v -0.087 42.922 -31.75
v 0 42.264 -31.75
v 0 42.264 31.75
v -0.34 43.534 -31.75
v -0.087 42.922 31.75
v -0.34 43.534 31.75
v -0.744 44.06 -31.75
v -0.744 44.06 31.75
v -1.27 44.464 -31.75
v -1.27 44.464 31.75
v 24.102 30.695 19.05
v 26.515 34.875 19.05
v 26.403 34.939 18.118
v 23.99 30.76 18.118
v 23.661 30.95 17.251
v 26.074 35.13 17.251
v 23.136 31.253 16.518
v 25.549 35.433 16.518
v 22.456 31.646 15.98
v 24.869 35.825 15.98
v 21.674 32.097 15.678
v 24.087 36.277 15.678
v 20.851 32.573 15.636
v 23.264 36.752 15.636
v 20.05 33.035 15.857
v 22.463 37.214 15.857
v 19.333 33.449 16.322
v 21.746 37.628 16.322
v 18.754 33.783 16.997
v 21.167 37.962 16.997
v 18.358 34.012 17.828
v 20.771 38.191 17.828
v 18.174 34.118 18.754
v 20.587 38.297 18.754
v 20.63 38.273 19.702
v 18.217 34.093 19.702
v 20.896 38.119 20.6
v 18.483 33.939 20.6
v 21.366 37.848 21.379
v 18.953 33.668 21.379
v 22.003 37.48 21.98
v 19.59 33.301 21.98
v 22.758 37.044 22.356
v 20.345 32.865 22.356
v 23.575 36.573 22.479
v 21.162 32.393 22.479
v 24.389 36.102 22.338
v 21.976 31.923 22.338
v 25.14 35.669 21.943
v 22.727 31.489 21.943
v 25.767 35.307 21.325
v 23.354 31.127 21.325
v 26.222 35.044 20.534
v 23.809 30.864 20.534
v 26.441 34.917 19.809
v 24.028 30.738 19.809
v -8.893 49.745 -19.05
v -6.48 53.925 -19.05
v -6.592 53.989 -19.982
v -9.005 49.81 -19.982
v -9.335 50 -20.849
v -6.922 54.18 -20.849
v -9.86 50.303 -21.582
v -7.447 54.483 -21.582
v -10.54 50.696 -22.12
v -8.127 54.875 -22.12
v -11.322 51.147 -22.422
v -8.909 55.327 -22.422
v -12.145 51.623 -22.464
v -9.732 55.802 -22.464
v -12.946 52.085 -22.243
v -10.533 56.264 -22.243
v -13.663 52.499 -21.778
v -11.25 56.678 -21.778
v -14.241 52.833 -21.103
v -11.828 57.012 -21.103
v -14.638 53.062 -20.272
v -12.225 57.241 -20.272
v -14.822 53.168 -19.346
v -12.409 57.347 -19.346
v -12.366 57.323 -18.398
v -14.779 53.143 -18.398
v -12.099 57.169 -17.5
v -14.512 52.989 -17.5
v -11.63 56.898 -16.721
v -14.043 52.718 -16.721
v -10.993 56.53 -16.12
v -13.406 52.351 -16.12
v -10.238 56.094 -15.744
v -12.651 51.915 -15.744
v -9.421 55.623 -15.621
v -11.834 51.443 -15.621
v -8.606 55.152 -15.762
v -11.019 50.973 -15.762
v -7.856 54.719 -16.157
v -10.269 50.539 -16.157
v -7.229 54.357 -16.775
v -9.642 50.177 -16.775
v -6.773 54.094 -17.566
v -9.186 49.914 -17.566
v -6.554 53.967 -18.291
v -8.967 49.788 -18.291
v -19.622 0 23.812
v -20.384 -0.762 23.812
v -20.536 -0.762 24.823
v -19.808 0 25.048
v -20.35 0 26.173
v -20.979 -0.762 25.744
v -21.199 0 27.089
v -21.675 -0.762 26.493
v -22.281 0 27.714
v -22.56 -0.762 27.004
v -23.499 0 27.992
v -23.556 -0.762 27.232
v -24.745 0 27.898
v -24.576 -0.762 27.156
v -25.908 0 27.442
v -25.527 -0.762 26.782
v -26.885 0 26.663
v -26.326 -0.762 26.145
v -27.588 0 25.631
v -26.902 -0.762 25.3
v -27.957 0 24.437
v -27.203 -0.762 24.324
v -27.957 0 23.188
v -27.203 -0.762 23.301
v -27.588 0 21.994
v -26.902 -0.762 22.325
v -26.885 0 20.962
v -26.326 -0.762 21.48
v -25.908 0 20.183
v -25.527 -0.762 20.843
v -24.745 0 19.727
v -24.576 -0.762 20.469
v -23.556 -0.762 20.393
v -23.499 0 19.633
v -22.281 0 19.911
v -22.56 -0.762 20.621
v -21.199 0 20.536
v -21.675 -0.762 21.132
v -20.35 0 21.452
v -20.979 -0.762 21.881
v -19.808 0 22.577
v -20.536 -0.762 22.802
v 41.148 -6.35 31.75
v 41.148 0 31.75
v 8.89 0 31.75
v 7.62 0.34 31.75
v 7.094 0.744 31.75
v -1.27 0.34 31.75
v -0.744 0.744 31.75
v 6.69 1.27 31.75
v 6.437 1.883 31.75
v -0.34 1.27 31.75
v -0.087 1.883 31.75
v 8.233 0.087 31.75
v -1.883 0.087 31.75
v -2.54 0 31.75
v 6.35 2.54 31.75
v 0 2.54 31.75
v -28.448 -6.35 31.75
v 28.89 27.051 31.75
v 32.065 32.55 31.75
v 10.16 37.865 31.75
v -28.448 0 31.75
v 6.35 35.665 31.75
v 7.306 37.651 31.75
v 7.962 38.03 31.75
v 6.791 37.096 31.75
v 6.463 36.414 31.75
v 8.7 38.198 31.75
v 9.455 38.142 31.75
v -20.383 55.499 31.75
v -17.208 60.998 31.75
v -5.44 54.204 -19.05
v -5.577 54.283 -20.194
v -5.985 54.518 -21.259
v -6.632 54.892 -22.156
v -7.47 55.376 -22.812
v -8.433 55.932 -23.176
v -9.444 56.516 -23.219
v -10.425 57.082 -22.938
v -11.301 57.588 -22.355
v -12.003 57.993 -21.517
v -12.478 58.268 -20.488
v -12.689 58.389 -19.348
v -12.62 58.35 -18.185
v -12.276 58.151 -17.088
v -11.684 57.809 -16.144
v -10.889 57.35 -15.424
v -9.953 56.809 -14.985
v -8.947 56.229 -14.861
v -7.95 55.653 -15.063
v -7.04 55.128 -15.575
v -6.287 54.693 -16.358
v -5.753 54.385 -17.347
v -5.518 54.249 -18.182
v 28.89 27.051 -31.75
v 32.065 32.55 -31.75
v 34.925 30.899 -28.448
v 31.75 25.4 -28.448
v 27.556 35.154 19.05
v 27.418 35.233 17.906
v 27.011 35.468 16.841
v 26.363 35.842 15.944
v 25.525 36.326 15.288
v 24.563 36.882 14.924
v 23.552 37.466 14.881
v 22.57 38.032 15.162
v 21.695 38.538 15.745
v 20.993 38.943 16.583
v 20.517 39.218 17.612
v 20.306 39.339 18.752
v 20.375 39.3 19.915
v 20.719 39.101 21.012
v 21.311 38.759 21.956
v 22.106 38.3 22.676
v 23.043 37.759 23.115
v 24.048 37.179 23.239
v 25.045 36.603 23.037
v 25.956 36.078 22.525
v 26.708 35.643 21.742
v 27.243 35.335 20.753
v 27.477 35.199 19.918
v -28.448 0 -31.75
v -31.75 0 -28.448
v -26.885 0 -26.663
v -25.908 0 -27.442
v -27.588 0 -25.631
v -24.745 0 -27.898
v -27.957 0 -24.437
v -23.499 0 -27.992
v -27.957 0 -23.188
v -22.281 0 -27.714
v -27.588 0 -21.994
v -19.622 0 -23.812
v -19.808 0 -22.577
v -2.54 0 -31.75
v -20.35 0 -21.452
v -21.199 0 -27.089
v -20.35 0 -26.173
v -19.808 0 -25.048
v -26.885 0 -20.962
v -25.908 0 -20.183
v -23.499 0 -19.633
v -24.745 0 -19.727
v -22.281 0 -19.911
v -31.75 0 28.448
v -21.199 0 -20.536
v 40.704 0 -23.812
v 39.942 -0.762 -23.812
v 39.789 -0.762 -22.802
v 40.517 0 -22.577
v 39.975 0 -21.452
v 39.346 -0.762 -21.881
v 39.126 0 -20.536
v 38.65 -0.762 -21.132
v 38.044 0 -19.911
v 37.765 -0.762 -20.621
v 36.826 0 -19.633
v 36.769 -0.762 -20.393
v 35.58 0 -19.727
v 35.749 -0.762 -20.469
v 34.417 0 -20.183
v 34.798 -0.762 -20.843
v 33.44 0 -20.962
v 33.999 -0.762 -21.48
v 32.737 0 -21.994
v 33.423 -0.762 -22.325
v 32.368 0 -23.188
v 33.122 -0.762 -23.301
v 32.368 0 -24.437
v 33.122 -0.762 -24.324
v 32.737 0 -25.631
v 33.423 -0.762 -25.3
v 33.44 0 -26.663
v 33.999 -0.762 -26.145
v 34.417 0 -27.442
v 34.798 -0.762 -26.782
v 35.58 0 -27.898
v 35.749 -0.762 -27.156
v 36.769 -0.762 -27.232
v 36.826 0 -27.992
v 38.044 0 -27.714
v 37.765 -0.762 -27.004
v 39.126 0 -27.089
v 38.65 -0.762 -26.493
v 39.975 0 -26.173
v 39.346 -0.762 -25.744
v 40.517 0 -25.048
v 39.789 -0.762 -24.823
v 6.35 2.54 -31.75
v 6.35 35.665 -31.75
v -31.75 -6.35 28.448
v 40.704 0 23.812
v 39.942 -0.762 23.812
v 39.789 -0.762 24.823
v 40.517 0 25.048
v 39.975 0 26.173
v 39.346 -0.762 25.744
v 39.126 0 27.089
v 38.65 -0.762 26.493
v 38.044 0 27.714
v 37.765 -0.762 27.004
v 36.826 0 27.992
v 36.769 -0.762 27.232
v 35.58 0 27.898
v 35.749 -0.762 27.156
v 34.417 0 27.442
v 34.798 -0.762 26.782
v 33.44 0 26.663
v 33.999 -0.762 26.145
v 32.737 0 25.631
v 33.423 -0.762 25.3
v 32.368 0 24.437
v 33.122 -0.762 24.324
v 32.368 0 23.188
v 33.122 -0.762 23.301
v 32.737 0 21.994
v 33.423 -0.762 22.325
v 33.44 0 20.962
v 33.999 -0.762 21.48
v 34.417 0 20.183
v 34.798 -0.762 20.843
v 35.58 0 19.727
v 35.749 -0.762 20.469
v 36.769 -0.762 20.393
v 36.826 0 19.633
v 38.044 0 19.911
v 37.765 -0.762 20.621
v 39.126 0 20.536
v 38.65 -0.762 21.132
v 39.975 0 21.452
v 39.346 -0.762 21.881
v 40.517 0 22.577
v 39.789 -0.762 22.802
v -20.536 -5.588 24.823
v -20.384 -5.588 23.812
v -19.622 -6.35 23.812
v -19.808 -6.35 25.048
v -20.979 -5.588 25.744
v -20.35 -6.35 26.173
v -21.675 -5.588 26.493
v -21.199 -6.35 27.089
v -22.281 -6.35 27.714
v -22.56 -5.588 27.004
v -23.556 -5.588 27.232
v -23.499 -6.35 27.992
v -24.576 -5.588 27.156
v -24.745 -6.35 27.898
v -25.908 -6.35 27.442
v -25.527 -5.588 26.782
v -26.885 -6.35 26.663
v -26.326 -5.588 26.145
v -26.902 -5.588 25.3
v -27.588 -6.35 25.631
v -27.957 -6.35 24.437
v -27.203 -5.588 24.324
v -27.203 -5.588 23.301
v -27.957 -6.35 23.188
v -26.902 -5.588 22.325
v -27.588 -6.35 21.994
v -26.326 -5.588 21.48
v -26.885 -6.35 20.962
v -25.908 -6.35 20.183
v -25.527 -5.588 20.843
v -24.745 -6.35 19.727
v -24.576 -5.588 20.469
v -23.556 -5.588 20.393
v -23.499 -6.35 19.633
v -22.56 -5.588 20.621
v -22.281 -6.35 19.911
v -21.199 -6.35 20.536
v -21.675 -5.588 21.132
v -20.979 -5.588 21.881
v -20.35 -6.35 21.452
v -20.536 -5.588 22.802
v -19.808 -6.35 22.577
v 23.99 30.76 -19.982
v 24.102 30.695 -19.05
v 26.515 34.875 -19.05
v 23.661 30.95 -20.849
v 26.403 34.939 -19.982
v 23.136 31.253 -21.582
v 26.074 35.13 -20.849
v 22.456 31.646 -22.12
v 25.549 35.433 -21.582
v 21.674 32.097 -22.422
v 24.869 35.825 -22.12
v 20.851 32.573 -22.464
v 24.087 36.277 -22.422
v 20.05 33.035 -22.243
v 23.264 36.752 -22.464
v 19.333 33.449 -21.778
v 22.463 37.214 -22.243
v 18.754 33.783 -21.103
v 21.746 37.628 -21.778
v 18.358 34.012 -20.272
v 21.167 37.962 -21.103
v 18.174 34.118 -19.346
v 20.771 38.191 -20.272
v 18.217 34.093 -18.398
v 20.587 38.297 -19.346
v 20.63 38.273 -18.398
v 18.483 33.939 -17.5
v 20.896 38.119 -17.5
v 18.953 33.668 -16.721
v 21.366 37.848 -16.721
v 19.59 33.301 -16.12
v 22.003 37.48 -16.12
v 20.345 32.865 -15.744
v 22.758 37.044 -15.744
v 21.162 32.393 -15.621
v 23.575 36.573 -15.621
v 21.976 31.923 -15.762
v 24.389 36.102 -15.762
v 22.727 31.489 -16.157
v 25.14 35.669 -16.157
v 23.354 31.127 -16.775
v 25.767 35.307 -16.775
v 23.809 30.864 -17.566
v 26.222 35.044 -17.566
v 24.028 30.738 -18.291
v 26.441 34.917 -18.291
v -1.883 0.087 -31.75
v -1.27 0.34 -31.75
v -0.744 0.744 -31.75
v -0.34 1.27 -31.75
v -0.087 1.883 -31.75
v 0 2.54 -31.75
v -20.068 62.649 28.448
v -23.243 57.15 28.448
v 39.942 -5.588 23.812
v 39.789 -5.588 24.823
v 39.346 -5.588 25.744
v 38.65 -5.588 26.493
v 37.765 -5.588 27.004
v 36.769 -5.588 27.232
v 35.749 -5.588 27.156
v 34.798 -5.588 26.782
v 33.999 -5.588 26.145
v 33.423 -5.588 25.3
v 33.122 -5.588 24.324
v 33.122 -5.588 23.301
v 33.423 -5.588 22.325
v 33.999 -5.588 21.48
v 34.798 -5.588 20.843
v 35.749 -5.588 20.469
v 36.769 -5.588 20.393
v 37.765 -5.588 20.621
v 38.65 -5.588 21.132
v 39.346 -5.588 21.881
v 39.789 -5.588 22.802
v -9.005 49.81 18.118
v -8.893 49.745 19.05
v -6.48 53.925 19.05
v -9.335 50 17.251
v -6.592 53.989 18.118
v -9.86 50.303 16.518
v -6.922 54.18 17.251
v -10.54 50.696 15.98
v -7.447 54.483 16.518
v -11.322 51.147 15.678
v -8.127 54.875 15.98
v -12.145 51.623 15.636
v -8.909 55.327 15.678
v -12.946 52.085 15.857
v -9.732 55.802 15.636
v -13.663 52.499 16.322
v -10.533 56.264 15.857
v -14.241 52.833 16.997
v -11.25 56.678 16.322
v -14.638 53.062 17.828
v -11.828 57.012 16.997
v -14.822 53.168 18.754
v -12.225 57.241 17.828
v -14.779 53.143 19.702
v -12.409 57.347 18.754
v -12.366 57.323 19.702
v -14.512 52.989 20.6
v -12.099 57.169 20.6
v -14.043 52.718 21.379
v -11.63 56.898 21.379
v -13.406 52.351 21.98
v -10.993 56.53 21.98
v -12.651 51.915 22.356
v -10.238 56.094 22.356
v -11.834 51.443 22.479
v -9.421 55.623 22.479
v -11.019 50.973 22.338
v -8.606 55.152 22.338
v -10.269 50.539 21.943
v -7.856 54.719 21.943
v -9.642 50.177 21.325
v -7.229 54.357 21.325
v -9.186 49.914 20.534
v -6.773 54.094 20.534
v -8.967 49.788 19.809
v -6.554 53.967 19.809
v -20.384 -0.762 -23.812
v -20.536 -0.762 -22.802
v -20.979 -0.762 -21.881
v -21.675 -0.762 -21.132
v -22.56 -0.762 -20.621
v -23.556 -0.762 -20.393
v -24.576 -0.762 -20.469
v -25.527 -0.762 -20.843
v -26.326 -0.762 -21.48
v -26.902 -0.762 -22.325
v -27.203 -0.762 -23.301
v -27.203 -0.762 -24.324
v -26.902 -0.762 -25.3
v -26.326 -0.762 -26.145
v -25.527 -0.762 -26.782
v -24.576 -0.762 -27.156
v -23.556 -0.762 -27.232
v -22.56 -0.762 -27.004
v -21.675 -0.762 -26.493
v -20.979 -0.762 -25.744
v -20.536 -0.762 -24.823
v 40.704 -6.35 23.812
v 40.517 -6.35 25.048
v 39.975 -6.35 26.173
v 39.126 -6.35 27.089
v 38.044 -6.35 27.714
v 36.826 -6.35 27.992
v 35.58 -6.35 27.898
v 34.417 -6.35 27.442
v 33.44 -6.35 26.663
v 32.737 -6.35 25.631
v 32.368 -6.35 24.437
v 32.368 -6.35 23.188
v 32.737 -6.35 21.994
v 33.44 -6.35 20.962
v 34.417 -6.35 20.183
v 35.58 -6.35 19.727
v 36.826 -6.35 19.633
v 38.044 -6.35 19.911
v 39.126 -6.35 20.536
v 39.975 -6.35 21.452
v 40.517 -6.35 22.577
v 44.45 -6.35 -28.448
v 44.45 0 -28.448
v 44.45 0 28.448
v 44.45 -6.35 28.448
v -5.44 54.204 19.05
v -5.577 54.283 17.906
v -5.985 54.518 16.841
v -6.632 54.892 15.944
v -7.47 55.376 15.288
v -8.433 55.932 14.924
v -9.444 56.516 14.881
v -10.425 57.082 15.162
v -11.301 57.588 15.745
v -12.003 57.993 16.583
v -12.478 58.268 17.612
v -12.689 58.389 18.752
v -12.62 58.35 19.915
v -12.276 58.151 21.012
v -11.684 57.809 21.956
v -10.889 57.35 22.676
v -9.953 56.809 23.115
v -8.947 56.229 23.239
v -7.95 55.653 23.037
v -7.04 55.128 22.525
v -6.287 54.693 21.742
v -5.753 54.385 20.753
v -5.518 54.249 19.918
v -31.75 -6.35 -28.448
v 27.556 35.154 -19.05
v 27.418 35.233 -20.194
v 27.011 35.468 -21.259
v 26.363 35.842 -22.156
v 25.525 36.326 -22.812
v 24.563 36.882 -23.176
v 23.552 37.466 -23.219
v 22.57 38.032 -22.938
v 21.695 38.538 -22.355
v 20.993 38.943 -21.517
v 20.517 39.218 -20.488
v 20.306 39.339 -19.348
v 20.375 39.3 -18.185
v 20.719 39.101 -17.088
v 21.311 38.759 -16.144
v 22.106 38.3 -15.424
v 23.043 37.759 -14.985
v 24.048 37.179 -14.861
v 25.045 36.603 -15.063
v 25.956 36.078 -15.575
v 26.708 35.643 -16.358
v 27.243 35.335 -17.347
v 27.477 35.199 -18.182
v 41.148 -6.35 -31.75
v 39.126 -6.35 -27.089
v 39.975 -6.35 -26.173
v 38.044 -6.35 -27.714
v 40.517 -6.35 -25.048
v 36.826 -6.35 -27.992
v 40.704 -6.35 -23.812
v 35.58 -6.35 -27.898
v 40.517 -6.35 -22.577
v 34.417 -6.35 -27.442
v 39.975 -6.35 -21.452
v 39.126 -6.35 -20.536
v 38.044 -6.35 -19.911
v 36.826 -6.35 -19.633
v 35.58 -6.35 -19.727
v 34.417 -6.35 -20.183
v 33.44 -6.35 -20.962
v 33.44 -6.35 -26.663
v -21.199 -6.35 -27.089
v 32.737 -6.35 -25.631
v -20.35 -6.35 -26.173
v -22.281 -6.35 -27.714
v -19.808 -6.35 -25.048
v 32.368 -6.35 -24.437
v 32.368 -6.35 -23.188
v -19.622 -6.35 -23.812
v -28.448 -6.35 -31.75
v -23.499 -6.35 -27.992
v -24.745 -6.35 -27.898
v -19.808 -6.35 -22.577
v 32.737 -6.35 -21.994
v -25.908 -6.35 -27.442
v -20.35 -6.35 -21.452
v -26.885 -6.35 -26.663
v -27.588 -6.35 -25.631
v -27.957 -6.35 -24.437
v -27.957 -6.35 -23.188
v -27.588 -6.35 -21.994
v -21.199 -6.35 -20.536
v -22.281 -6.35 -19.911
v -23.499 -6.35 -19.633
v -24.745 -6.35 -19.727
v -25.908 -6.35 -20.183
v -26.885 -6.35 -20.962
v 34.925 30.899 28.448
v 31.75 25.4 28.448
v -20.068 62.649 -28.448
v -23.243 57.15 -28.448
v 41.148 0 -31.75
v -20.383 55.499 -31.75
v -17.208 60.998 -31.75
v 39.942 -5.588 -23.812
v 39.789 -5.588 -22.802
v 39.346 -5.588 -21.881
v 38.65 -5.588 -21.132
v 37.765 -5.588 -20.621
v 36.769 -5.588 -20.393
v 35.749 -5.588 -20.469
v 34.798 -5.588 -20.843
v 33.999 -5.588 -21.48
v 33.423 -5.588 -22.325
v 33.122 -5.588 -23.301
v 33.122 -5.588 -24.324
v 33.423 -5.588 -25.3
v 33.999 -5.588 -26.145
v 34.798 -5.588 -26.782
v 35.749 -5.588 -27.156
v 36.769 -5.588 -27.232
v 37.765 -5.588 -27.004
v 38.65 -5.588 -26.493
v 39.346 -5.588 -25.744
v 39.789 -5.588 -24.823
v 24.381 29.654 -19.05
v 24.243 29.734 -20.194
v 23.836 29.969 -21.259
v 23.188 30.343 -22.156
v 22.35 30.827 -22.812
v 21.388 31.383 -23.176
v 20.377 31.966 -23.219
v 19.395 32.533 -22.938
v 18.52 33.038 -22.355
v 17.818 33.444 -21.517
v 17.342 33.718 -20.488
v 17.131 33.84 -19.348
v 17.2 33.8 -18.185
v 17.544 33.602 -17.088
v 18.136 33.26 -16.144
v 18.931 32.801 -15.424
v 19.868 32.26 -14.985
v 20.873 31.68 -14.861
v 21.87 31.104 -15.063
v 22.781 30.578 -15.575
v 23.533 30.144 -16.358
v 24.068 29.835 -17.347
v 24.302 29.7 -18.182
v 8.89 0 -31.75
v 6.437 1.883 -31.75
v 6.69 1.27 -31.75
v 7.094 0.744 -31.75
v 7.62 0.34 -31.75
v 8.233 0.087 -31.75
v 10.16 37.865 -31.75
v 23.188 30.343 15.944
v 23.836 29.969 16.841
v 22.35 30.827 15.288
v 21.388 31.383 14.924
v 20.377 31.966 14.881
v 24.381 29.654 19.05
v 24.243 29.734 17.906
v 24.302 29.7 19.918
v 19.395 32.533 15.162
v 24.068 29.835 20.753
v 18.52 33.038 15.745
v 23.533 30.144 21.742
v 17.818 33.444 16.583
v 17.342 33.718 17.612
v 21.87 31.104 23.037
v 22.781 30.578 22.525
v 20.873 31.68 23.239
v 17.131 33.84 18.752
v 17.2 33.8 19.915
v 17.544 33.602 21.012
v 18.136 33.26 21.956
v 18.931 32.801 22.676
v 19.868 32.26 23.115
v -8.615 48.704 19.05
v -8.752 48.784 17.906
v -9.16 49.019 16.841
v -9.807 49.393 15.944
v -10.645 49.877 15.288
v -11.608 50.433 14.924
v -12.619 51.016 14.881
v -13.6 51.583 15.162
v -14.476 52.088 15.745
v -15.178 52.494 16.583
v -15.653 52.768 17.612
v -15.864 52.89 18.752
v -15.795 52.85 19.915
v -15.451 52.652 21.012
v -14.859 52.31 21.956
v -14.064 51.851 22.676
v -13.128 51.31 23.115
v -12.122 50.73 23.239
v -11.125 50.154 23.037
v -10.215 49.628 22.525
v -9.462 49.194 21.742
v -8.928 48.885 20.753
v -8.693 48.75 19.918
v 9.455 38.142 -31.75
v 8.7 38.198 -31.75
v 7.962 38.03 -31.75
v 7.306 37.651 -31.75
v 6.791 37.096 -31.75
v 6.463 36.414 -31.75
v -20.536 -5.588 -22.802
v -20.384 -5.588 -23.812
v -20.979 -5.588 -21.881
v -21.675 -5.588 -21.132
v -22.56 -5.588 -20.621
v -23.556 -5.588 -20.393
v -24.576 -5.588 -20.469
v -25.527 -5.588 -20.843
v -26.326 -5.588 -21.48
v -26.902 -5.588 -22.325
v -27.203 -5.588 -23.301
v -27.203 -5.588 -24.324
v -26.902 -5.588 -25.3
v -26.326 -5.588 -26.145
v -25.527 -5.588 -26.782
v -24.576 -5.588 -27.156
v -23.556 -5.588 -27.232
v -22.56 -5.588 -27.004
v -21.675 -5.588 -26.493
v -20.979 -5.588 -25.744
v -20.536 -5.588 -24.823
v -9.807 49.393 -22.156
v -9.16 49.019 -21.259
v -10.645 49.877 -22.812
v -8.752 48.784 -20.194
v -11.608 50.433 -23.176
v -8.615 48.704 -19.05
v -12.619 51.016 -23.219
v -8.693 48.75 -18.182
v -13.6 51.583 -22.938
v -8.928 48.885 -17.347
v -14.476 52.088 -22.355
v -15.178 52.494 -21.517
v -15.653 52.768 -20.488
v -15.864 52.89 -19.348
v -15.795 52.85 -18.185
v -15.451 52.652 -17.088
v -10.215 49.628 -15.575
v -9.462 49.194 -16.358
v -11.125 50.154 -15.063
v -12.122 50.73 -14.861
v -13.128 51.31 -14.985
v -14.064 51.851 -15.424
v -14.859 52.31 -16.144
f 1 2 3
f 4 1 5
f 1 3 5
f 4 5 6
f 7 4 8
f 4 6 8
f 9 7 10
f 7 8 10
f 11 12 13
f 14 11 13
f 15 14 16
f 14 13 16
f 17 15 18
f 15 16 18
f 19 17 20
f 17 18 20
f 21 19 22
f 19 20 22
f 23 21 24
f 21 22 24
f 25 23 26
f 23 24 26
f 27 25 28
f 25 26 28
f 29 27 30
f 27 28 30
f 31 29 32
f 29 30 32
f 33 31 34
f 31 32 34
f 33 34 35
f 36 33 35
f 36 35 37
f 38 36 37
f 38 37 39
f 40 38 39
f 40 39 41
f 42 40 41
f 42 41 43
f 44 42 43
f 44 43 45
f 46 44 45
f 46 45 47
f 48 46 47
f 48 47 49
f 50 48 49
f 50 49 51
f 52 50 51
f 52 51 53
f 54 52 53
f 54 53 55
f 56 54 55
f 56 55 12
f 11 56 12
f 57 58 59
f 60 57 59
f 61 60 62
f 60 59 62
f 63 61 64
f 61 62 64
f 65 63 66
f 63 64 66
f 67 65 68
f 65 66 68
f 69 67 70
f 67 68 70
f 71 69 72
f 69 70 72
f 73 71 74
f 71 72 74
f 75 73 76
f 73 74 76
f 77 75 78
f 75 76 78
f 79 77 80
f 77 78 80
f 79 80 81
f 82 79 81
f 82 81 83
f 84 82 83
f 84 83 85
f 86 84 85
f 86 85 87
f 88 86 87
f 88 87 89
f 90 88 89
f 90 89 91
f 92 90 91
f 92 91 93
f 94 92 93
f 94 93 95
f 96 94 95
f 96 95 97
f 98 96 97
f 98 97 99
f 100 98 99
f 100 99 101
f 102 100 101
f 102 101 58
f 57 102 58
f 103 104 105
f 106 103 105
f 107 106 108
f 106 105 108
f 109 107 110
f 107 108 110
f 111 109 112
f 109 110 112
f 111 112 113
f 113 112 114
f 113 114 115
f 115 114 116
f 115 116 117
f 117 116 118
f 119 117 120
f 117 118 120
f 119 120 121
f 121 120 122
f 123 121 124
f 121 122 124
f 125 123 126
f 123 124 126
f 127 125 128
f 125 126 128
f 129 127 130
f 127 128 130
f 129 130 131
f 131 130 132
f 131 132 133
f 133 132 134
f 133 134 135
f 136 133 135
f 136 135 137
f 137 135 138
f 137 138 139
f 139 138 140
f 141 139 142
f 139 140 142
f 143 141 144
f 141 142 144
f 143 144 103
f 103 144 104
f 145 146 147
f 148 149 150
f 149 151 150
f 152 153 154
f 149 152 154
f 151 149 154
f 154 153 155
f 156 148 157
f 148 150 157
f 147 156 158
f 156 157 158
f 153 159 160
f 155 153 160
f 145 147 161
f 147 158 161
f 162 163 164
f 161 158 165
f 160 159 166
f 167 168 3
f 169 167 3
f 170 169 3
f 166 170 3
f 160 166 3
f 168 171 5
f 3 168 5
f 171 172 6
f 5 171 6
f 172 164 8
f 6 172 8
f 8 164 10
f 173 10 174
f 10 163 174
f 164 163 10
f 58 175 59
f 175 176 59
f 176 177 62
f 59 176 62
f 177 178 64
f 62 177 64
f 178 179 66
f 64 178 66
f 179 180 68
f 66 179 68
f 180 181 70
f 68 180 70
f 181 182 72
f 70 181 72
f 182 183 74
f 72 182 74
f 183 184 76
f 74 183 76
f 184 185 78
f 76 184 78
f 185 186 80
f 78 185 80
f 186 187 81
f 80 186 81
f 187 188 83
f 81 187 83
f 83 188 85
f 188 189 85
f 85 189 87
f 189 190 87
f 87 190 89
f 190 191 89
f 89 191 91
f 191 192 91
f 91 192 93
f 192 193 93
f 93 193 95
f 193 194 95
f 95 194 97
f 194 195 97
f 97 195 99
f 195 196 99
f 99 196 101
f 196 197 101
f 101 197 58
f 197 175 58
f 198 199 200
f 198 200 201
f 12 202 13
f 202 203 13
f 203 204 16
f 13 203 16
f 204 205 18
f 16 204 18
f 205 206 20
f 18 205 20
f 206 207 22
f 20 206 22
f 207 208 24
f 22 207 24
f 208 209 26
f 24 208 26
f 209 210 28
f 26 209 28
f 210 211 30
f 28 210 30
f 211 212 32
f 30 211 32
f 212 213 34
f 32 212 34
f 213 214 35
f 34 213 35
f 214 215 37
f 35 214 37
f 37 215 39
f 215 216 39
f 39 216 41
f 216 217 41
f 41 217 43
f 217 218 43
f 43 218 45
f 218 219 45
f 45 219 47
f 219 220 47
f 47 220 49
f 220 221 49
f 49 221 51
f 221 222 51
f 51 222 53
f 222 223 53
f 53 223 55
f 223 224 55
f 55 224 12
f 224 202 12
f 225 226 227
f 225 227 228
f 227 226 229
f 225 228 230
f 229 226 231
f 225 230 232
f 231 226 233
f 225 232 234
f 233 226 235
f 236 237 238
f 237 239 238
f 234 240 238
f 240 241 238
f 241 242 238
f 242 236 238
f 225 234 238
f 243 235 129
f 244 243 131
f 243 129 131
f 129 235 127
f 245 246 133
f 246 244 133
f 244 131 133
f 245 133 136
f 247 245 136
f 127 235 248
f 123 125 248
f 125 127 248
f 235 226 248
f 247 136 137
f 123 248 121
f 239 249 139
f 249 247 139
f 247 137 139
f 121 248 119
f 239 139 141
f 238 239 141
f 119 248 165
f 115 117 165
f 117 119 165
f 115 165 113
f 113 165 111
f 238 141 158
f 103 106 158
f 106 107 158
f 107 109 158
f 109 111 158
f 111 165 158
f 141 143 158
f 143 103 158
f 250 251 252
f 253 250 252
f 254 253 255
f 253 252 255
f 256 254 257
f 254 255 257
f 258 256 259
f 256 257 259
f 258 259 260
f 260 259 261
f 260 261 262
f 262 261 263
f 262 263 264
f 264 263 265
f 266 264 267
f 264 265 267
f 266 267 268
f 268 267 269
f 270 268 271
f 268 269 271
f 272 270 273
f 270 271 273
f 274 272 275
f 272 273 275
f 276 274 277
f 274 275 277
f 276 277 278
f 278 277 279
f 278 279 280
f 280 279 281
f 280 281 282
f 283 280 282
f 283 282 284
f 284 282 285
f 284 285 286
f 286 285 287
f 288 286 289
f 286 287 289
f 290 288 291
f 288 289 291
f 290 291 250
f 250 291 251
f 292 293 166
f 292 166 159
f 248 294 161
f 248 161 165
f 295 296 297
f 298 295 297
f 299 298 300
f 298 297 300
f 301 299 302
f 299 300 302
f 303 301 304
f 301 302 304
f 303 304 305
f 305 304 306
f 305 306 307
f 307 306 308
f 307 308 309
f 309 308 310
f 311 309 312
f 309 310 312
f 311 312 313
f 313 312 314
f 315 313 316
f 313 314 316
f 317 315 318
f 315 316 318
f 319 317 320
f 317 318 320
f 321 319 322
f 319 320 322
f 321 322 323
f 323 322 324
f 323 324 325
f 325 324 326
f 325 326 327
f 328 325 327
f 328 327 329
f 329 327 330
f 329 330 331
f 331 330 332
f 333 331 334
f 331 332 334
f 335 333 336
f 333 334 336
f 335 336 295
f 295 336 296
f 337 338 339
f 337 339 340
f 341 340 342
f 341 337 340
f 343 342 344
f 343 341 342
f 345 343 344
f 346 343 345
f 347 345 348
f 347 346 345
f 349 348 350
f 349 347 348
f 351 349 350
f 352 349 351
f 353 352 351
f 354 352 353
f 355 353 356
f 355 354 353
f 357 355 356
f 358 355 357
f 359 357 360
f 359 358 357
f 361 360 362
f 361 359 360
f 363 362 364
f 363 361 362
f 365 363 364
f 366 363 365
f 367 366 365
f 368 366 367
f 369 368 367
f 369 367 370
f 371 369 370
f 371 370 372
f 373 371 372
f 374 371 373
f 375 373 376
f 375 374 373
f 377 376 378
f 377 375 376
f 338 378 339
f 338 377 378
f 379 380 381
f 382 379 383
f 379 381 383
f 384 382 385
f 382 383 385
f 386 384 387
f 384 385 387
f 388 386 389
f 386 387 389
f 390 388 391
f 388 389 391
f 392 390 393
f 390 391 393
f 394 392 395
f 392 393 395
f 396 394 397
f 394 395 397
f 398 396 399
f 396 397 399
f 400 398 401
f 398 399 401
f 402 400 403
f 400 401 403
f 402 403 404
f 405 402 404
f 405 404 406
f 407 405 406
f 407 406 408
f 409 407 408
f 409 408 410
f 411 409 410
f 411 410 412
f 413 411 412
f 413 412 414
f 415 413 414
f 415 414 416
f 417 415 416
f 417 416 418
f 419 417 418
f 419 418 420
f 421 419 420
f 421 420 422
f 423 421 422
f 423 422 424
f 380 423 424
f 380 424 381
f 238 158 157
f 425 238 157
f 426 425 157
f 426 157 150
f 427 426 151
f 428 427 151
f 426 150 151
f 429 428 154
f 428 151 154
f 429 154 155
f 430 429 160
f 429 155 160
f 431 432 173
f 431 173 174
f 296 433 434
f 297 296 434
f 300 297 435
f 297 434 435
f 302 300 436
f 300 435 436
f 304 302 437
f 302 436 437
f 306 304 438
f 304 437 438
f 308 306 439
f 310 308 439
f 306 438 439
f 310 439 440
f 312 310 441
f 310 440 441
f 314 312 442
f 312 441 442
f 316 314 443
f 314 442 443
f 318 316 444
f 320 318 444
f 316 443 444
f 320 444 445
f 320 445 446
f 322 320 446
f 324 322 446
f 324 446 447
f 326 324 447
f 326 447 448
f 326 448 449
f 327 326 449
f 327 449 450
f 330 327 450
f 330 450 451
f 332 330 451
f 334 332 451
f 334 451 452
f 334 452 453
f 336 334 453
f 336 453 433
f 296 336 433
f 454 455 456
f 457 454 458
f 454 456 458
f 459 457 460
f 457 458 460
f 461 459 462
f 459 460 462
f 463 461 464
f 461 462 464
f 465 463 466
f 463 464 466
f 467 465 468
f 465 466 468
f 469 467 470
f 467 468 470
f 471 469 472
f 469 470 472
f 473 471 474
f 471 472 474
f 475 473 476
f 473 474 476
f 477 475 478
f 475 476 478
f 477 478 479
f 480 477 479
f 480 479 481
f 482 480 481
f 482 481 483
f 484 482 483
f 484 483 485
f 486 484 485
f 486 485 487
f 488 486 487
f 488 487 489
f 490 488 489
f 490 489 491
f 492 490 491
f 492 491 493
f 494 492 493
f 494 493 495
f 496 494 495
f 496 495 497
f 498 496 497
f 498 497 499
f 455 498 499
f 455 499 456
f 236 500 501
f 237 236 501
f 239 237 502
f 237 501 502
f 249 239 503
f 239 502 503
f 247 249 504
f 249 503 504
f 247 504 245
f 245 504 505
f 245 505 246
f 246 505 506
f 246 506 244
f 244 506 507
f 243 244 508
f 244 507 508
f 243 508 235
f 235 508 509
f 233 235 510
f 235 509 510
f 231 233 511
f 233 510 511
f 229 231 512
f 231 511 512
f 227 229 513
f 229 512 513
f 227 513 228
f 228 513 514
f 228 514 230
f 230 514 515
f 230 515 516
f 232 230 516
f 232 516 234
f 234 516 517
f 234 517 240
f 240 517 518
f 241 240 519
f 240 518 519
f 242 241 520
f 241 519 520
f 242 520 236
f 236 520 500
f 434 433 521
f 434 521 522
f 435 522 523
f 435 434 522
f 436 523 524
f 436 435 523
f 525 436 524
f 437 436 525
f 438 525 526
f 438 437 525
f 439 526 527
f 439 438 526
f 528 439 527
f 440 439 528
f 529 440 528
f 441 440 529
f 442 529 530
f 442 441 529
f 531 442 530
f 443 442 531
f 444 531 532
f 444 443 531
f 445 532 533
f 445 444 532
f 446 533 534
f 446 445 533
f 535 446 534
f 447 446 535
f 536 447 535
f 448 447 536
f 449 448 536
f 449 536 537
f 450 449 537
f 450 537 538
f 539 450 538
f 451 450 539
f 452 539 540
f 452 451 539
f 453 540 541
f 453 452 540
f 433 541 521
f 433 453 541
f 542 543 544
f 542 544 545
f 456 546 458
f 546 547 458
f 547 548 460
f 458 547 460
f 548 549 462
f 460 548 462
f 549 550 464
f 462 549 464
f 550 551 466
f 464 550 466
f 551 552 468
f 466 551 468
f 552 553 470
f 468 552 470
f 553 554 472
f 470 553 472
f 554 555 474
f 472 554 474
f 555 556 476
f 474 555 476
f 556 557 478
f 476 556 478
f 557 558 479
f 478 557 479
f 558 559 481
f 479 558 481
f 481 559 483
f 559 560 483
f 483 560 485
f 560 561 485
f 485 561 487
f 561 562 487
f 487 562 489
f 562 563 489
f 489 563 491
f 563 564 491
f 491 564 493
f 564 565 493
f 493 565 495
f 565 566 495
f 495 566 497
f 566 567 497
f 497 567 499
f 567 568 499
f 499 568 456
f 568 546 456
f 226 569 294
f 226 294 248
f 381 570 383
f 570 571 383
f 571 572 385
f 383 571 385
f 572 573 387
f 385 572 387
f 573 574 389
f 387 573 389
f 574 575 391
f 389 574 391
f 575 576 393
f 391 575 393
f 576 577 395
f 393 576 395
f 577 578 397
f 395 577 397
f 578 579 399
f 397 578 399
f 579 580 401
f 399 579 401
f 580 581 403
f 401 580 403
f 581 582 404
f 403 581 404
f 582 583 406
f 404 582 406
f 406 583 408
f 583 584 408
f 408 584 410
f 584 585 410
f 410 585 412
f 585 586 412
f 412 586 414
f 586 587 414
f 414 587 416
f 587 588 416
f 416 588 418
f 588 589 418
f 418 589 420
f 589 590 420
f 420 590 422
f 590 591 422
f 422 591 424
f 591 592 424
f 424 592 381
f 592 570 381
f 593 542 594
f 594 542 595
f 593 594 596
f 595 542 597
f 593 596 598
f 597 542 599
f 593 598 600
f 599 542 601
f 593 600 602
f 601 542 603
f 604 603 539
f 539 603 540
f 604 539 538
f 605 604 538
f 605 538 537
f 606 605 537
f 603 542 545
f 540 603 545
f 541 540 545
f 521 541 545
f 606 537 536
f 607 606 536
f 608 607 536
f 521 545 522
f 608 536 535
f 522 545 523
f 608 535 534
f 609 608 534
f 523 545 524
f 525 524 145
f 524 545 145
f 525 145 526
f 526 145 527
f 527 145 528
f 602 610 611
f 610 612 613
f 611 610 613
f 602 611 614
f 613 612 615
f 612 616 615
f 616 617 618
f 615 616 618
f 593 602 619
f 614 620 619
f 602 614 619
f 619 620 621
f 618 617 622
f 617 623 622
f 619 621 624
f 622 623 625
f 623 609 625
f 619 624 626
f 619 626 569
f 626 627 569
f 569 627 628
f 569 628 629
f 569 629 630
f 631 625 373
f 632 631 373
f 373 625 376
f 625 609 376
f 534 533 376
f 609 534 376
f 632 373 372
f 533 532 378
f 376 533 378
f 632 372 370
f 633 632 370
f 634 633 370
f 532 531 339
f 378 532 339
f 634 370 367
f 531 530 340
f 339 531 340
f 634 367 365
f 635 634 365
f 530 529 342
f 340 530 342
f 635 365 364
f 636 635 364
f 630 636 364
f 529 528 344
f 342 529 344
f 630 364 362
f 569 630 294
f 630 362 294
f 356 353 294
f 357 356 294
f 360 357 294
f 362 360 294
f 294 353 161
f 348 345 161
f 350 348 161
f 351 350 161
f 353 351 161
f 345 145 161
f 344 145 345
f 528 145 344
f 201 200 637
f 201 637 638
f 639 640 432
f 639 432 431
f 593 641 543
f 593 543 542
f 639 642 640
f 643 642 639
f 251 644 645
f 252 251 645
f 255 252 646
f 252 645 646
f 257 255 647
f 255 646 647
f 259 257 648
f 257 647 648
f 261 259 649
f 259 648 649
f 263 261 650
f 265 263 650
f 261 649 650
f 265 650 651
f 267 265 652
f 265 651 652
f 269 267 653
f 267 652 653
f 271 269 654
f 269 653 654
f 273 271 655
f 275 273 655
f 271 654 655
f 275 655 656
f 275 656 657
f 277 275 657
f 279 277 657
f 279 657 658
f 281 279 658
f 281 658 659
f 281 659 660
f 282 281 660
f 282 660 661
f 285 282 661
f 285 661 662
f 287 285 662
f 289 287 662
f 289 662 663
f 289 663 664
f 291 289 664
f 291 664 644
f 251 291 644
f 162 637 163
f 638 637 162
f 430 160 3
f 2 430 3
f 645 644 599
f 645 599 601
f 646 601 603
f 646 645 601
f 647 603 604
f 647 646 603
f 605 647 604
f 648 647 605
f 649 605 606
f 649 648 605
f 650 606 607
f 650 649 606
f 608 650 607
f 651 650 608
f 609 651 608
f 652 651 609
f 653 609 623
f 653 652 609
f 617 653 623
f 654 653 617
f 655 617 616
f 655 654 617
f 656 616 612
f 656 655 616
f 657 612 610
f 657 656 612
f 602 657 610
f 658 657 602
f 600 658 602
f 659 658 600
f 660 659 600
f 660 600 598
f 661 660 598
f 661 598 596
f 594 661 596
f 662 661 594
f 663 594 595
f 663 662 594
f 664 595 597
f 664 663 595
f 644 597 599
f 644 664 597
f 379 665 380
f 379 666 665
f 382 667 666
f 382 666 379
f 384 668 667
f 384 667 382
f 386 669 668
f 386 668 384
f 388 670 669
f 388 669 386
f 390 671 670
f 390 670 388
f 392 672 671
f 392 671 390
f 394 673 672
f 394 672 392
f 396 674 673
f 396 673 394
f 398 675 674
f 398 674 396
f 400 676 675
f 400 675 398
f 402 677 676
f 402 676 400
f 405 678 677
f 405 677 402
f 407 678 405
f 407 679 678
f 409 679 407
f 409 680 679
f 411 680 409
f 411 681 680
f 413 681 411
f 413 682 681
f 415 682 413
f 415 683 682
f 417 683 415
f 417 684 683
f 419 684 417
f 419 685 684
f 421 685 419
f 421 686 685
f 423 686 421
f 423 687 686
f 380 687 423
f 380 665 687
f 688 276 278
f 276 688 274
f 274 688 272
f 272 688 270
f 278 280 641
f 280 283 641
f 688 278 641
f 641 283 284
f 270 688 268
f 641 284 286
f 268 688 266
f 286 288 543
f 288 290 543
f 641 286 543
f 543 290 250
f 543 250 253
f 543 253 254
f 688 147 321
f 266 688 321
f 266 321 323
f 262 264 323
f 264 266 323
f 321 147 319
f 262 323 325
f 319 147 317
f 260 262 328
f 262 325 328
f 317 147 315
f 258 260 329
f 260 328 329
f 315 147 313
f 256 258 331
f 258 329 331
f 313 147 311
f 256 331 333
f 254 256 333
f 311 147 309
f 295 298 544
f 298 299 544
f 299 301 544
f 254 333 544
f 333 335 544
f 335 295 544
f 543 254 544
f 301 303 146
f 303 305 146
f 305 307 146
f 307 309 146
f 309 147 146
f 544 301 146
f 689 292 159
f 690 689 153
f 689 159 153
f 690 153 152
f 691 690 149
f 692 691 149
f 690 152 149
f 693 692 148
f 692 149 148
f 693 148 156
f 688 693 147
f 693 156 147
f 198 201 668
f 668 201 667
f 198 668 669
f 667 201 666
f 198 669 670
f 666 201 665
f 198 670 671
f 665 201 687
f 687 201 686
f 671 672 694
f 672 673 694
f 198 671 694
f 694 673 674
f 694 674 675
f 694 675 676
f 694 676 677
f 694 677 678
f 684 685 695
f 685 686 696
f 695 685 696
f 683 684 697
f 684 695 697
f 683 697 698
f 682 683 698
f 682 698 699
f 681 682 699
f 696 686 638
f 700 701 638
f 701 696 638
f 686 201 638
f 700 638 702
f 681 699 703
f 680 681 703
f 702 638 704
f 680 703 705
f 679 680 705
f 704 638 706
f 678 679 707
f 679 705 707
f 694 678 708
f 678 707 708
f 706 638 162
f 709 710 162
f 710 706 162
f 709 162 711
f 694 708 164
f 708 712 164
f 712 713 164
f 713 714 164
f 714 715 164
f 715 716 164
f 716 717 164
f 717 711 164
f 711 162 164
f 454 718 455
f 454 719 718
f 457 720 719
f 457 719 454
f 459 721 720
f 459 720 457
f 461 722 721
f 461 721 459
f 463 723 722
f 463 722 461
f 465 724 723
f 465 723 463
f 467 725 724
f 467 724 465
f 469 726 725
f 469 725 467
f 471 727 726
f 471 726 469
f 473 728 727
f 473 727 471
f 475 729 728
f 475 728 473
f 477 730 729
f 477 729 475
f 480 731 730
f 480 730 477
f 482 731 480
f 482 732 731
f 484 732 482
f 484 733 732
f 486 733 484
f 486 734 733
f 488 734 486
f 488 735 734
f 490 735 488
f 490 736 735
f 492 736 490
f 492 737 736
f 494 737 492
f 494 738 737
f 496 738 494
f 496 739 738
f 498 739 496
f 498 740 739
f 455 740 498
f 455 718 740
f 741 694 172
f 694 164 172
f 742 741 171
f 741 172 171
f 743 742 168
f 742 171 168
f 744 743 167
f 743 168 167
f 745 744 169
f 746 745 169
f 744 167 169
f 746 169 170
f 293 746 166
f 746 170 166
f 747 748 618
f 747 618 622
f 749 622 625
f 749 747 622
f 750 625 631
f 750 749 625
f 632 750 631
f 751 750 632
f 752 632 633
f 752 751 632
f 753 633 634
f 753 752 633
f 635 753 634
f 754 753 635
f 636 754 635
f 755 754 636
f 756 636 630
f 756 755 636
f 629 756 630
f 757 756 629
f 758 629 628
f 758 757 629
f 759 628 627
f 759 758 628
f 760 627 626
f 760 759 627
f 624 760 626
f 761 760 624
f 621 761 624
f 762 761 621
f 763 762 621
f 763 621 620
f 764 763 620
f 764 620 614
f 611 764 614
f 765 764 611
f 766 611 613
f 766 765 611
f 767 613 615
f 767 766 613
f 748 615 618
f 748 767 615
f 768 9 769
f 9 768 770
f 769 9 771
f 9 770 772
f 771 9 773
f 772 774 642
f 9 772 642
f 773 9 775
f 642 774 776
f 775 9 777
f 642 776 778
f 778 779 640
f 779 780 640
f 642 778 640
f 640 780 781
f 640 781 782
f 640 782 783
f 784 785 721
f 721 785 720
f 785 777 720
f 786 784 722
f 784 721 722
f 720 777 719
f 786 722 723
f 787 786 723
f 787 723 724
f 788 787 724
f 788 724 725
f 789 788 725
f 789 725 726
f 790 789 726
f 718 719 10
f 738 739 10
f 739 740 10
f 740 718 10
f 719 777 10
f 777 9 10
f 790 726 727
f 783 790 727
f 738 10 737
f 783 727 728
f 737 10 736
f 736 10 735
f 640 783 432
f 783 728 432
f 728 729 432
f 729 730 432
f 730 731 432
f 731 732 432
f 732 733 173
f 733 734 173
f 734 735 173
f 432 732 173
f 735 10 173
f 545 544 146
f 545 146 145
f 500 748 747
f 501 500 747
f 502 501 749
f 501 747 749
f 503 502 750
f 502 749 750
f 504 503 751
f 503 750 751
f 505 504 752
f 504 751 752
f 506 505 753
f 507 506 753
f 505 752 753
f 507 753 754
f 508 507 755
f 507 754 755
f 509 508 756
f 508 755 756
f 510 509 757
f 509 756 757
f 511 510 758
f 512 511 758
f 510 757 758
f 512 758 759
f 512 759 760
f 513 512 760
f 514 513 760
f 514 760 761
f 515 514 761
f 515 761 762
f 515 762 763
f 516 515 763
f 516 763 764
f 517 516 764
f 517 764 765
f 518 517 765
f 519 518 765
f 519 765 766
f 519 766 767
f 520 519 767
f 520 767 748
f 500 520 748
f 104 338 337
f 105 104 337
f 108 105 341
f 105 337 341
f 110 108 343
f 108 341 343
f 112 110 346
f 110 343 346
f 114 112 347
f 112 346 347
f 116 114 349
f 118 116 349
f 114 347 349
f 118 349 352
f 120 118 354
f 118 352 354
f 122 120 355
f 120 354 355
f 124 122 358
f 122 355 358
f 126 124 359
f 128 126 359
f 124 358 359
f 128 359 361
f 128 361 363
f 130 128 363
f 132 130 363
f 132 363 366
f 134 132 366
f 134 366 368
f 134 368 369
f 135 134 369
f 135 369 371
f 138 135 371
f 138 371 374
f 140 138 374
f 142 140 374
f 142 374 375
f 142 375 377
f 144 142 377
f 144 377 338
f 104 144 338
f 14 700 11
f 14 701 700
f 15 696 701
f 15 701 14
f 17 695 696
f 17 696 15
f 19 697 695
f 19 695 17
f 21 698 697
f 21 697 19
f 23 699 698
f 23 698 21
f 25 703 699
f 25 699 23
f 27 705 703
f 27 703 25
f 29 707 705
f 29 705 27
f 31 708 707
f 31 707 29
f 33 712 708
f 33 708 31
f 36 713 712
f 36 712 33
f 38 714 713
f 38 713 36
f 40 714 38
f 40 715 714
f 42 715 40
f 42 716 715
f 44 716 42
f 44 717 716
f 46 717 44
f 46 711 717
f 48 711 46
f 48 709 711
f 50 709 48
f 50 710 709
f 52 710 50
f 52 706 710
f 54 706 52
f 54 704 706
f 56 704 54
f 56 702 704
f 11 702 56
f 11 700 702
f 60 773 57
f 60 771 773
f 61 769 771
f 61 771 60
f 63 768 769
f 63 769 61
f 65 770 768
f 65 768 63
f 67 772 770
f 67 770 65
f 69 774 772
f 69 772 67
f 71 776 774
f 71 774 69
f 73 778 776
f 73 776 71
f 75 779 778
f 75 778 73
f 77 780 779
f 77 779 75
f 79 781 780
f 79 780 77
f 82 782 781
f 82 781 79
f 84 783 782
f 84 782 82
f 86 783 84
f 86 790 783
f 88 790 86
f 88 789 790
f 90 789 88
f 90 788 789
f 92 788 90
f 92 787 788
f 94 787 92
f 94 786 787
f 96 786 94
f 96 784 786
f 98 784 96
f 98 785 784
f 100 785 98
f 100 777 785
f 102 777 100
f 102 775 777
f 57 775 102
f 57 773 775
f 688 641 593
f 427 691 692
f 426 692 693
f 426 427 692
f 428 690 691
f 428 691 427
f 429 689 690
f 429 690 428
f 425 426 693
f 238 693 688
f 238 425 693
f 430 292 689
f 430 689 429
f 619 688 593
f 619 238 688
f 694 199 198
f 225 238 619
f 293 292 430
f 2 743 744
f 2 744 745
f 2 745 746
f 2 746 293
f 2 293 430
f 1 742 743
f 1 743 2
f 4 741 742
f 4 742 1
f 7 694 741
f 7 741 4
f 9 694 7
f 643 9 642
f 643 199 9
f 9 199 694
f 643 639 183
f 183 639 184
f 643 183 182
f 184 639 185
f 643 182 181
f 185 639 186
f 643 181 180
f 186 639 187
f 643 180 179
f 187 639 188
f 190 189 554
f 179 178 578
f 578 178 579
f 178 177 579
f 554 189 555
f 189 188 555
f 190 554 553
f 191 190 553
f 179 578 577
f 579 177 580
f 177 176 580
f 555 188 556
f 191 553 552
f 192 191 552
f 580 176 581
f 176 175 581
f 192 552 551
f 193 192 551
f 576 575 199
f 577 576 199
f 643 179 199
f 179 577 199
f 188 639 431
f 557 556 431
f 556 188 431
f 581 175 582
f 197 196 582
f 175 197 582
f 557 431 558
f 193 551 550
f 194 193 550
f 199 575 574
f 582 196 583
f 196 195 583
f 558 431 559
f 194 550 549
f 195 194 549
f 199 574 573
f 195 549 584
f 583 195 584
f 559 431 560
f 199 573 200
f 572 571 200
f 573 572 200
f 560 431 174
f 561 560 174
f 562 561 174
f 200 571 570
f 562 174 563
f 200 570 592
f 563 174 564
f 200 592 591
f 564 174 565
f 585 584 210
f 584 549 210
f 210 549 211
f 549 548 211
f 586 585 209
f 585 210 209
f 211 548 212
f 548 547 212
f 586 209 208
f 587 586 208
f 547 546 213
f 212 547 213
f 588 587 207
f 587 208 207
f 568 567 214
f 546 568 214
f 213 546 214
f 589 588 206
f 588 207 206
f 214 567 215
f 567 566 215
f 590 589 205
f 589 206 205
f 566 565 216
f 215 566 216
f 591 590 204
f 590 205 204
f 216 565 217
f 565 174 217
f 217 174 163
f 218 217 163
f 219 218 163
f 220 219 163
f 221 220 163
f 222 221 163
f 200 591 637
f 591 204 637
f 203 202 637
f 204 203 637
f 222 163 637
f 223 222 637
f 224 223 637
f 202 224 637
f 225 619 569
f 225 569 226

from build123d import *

# Parameters (mm, degrees)
BOSS_EXTRUDE1_DEPTH = 31.75
CHAMFER1_SIZE       = 3.302
CUT_EXTRUDE1_REACH  = 67.596
SKETCH2_R           = 3.429
CUT_EXTRUDE2_REACH  = 70.999
SKETCH3_R           = 3.429
CHAMFER2_SIZE       = 0.762


with BuildPart() as part:
    # Sketch1 → Boss-Extrude1 (new body, symmetric)
    with BuildSketch(Plane.XY):
        with BuildLine():
            Line((0, 2.54), (0, 42.264401363))
            ThreePointArc((0, 42.264401363), (-0.340295474, 43.534401363), (-1.27, 44.464105889))
            Line((-1.27, 44.464105889), (-23.24261314, 57.15))
            Line((-23.24261314, 57.15), (-20.06761314, 62.649261314))
            Line((-20.06761314, 62.649261314), (34.925, 30.899261314))
            Line((34.925, 30.899261314), (31.75, 25.4))
            Line((31.75, 25.4), (10.16, 37.864992312))
            ThreePointArc((10.16, 37.864992312), (7.62, 37.864992312), (6.35, 35.665287786))
            Line((6.35, 35.665287786), (6.35, 2.54))
            ThreePointArc((6.35, 2.54), (7.093948776, 0.743948776), (8.89, 0))
            Line((8.89, 0), (44.45, 0))
            Line((44.45, 0), (44.45, -6.35))
            Line((44.45, -6.35), (-31.75, -6.35))
            Line((-31.75, -6.35), (-31.75, 0))
            Line((-31.75, 0), (-2.54, 0))
            ThreePointArc((-2.54, 0), (-0.743948776, 0.743948776), (0, 2.54))
        make_face()
    extrude(amount=BOSS_EXTRUDE1_DEPTH, both=True)

    # Chamfer1
    chamfer1_edges = [part.edges().sort_by_distance(p)[0] for p in [
        (33.3375, 28.149630657, -31.75),
        (44.45, -3.175, -31.75),
        (-31.75, -3.175, -31.75),
        (-21.65511314, 59.899630657, -31.75),
        (-31.75, -3.175, 31.75),
        (44.45, -3.175, 31.75),
        (-21.65511314, 59.899630657, 31.75),
        (33.3375, 28.149630657, 31.75),
    ]]
    chamfer(chamfer1_edges, length=CHAMFER1_SIZE)

    # Sketch2 → Cut-Extrude1 (cut, up to next)
    with BuildSketch(Plane(origin=(22.111022628, 38.297414599, 0), x_dir=(0.866025404, -0.5, 0), z_dir=(0.5, 0.866025404, 0)), mode=Mode.PRIVATE) as cut_extrude1_sk1:
        with Locations((-36.00369343, 19.05)):
            Circle(SKETCH2_R)
    cut_extrude1_tool1 = extrude(cut_extrude1_sk1.sketch, amount=-CUT_EXTRUDE1_REACH, mode=Mode.PRIVATE) & part.part
    add(cut_extrude1_tool1.solids().sort_by_distance((-9.069091, 56.299261, -19.05))[0], mode=Mode.SUBTRACT)
    # Sketch2 → Cut-Extrude1 (cut, up to next)
    with BuildSketch(Plane(origin=(22.111022628, 38.297414599, 0), x_dir=(0.866025404, -0.5, 0), z_dir=(0.5, 0.866025404, 0)), mode=Mode.PRIVATE) as cut_extrude1_sk2:
        with Locations((2.09630657, 19.05)):
            Circle(SKETCH2_R)
    cut_extrude1_tool2 = extrude(cut_extrude1_sk2.sketch, amount=-CUT_EXTRUDE1_REACH, mode=Mode.PRIVATE) & part.part
    add(cut_extrude1_tool2.solids().sort_by_distance((23.926477, 37.249261, -19.05))[0], mode=Mode.SUBTRACT)
    # Sketch2 → Cut-Extrude1 (cut, up to next)
    with BuildSketch(Plane(origin=(22.111022628, 38.297414599, 0), x_dir=(0.866025404, -0.5, 0), z_dir=(0.5, 0.866025404, 0)), mode=Mode.PRIVATE) as cut_extrude1_sk3:
        with Locations((-36.00369343, -19.05)):
            Circle(SKETCH2_R)
    cut_extrude1_tool3 = extrude(cut_extrude1_sk3.sketch, amount=-CUT_EXTRUDE1_REACH, mode=Mode.PRIVATE) & part.part
    add(cut_extrude1_tool3.solids().sort_by_distance((-9.069091, 56.299261, 19.05))[0], mode=Mode.SUBTRACT)
    # Sketch2 → Cut-Extrude1 (cut, up to next)
    with BuildSketch(Plane(origin=(22.111022628, 38.297414599, 0), x_dir=(0.866025404, -0.5, 0), z_dir=(0.5, 0.866025404, 0)), mode=Mode.PRIVATE) as cut_extrude1_sk4:
        with Locations((2.09630657, -19.05)):
            Circle(SKETCH2_R)
    cut_extrude1_tool4 = extrude(cut_extrude1_sk4.sketch, amount=-CUT_EXTRUDE1_REACH, mode=Mode.PRIVATE) & part.part
    add(cut_extrude1_tool4.solids().sort_by_distance((23.926477, 37.249261, 19.05))[0], mode=Mode.SUBTRACT)

    # Sketch3 → Cut-Extrude2 (cut, up to next)
    with BuildSketch(Plane.XZ.offset(6.35), mode=Mode.PRIVATE) as cut_extrude2_sk1:
        with Locations((-23.8125, 23.8125)):
            Circle(SKETCH3_R)
    cut_extrude2_tool1 = extrude(cut_extrude2_sk1.sketch, amount=-CUT_EXTRUDE2_REACH, mode=Mode.PRIVATE) & part.part
    add(cut_extrude2_tool1.solids().sort_by_distance((-23.8125, -6.35, 23.8125))[0], mode=Mode.SUBTRACT)
    # Sketch3 → Cut-Extrude2 (cut, up to next)
    with BuildSketch(Plane.XZ.offset(6.35), mode=Mode.PRIVATE) as cut_extrude2_sk2:
        with Locations((36.5125, 23.8125)):
            Circle(SKETCH3_R)
    cut_extrude2_tool2 = extrude(cut_extrude2_sk2.sketch, amount=-CUT_EXTRUDE2_REACH, mode=Mode.PRIVATE) & part.part
    add(cut_extrude2_tool2.solids().sort_by_distance((36.5125, -6.35, 23.8125))[0], mode=Mode.SUBTRACT)
    # Sketch3 → Cut-Extrude2 (cut, up to next)
    with BuildSketch(Plane.XZ.offset(6.35), mode=Mode.PRIVATE) as cut_extrude2_sk3:
        with Locations((-23.8125, -23.8125)):
            Circle(SKETCH3_R)
    cut_extrude2_tool3 = extrude(cut_extrude2_sk3.sketch, amount=-CUT_EXTRUDE2_REACH, mode=Mode.PRIVATE) & part.part
    add(cut_extrude2_tool3.solids().sort_by_distance((-23.8125, -6.35, -23.8125))[0], mode=Mode.SUBTRACT)
    # Sketch3 → Cut-Extrude2 (cut, up to next)
    with BuildSketch(Plane.XZ.offset(6.35), mode=Mode.PRIVATE) as cut_extrude2_sk4:
        with Locations((36.5125, -23.8125)):
            Circle(SKETCH3_R)
    cut_extrude2_tool4 = extrude(cut_extrude2_sk4.sketch, amount=-CUT_EXTRUDE2_REACH, mode=Mode.PRIVATE) & part.part
    add(cut_extrude2_tool4.solids().sort_by_distance((36.5125, -6.35, -23.8125))[0], mode=Mode.SUBTRACT)

    # Chamfer2
    chamfer2_edges = [part.edges().sort_by_distance(p)[0] for p in [
        (17.781876262, 33.4645, -19.05),
        (20.956876262, 38.963761314, -19.05),
        (-12.038691622, 58.013761314, 19.05),
        (-15.213691622, 52.5145, 19.05),
        (17.781876262, 33.4645, 19.05),
        (20.956876262, 38.963761314, 19.05),
        (-12.038691622, 58.013761314, -19.05),
        (-15.213691622, 52.5145, -19.05),
        (33.0835, -6.35, 23.8125),
        (33.0835, 0, 23.8125),
        (-27.2415, -6.35, -23.8125),
        (-27.2415, 0, -23.8125),
        (33.0835, -6.35, -23.8125),
        (33.0835, 0, -23.8125),
        (-27.2415, -6.35, 23.8125),
        (-27.2415, 0, 23.8125),
    ]]
    chamfer(chamfer2_edges, length=CHAMFER2_SIZE)


solid = part.part
